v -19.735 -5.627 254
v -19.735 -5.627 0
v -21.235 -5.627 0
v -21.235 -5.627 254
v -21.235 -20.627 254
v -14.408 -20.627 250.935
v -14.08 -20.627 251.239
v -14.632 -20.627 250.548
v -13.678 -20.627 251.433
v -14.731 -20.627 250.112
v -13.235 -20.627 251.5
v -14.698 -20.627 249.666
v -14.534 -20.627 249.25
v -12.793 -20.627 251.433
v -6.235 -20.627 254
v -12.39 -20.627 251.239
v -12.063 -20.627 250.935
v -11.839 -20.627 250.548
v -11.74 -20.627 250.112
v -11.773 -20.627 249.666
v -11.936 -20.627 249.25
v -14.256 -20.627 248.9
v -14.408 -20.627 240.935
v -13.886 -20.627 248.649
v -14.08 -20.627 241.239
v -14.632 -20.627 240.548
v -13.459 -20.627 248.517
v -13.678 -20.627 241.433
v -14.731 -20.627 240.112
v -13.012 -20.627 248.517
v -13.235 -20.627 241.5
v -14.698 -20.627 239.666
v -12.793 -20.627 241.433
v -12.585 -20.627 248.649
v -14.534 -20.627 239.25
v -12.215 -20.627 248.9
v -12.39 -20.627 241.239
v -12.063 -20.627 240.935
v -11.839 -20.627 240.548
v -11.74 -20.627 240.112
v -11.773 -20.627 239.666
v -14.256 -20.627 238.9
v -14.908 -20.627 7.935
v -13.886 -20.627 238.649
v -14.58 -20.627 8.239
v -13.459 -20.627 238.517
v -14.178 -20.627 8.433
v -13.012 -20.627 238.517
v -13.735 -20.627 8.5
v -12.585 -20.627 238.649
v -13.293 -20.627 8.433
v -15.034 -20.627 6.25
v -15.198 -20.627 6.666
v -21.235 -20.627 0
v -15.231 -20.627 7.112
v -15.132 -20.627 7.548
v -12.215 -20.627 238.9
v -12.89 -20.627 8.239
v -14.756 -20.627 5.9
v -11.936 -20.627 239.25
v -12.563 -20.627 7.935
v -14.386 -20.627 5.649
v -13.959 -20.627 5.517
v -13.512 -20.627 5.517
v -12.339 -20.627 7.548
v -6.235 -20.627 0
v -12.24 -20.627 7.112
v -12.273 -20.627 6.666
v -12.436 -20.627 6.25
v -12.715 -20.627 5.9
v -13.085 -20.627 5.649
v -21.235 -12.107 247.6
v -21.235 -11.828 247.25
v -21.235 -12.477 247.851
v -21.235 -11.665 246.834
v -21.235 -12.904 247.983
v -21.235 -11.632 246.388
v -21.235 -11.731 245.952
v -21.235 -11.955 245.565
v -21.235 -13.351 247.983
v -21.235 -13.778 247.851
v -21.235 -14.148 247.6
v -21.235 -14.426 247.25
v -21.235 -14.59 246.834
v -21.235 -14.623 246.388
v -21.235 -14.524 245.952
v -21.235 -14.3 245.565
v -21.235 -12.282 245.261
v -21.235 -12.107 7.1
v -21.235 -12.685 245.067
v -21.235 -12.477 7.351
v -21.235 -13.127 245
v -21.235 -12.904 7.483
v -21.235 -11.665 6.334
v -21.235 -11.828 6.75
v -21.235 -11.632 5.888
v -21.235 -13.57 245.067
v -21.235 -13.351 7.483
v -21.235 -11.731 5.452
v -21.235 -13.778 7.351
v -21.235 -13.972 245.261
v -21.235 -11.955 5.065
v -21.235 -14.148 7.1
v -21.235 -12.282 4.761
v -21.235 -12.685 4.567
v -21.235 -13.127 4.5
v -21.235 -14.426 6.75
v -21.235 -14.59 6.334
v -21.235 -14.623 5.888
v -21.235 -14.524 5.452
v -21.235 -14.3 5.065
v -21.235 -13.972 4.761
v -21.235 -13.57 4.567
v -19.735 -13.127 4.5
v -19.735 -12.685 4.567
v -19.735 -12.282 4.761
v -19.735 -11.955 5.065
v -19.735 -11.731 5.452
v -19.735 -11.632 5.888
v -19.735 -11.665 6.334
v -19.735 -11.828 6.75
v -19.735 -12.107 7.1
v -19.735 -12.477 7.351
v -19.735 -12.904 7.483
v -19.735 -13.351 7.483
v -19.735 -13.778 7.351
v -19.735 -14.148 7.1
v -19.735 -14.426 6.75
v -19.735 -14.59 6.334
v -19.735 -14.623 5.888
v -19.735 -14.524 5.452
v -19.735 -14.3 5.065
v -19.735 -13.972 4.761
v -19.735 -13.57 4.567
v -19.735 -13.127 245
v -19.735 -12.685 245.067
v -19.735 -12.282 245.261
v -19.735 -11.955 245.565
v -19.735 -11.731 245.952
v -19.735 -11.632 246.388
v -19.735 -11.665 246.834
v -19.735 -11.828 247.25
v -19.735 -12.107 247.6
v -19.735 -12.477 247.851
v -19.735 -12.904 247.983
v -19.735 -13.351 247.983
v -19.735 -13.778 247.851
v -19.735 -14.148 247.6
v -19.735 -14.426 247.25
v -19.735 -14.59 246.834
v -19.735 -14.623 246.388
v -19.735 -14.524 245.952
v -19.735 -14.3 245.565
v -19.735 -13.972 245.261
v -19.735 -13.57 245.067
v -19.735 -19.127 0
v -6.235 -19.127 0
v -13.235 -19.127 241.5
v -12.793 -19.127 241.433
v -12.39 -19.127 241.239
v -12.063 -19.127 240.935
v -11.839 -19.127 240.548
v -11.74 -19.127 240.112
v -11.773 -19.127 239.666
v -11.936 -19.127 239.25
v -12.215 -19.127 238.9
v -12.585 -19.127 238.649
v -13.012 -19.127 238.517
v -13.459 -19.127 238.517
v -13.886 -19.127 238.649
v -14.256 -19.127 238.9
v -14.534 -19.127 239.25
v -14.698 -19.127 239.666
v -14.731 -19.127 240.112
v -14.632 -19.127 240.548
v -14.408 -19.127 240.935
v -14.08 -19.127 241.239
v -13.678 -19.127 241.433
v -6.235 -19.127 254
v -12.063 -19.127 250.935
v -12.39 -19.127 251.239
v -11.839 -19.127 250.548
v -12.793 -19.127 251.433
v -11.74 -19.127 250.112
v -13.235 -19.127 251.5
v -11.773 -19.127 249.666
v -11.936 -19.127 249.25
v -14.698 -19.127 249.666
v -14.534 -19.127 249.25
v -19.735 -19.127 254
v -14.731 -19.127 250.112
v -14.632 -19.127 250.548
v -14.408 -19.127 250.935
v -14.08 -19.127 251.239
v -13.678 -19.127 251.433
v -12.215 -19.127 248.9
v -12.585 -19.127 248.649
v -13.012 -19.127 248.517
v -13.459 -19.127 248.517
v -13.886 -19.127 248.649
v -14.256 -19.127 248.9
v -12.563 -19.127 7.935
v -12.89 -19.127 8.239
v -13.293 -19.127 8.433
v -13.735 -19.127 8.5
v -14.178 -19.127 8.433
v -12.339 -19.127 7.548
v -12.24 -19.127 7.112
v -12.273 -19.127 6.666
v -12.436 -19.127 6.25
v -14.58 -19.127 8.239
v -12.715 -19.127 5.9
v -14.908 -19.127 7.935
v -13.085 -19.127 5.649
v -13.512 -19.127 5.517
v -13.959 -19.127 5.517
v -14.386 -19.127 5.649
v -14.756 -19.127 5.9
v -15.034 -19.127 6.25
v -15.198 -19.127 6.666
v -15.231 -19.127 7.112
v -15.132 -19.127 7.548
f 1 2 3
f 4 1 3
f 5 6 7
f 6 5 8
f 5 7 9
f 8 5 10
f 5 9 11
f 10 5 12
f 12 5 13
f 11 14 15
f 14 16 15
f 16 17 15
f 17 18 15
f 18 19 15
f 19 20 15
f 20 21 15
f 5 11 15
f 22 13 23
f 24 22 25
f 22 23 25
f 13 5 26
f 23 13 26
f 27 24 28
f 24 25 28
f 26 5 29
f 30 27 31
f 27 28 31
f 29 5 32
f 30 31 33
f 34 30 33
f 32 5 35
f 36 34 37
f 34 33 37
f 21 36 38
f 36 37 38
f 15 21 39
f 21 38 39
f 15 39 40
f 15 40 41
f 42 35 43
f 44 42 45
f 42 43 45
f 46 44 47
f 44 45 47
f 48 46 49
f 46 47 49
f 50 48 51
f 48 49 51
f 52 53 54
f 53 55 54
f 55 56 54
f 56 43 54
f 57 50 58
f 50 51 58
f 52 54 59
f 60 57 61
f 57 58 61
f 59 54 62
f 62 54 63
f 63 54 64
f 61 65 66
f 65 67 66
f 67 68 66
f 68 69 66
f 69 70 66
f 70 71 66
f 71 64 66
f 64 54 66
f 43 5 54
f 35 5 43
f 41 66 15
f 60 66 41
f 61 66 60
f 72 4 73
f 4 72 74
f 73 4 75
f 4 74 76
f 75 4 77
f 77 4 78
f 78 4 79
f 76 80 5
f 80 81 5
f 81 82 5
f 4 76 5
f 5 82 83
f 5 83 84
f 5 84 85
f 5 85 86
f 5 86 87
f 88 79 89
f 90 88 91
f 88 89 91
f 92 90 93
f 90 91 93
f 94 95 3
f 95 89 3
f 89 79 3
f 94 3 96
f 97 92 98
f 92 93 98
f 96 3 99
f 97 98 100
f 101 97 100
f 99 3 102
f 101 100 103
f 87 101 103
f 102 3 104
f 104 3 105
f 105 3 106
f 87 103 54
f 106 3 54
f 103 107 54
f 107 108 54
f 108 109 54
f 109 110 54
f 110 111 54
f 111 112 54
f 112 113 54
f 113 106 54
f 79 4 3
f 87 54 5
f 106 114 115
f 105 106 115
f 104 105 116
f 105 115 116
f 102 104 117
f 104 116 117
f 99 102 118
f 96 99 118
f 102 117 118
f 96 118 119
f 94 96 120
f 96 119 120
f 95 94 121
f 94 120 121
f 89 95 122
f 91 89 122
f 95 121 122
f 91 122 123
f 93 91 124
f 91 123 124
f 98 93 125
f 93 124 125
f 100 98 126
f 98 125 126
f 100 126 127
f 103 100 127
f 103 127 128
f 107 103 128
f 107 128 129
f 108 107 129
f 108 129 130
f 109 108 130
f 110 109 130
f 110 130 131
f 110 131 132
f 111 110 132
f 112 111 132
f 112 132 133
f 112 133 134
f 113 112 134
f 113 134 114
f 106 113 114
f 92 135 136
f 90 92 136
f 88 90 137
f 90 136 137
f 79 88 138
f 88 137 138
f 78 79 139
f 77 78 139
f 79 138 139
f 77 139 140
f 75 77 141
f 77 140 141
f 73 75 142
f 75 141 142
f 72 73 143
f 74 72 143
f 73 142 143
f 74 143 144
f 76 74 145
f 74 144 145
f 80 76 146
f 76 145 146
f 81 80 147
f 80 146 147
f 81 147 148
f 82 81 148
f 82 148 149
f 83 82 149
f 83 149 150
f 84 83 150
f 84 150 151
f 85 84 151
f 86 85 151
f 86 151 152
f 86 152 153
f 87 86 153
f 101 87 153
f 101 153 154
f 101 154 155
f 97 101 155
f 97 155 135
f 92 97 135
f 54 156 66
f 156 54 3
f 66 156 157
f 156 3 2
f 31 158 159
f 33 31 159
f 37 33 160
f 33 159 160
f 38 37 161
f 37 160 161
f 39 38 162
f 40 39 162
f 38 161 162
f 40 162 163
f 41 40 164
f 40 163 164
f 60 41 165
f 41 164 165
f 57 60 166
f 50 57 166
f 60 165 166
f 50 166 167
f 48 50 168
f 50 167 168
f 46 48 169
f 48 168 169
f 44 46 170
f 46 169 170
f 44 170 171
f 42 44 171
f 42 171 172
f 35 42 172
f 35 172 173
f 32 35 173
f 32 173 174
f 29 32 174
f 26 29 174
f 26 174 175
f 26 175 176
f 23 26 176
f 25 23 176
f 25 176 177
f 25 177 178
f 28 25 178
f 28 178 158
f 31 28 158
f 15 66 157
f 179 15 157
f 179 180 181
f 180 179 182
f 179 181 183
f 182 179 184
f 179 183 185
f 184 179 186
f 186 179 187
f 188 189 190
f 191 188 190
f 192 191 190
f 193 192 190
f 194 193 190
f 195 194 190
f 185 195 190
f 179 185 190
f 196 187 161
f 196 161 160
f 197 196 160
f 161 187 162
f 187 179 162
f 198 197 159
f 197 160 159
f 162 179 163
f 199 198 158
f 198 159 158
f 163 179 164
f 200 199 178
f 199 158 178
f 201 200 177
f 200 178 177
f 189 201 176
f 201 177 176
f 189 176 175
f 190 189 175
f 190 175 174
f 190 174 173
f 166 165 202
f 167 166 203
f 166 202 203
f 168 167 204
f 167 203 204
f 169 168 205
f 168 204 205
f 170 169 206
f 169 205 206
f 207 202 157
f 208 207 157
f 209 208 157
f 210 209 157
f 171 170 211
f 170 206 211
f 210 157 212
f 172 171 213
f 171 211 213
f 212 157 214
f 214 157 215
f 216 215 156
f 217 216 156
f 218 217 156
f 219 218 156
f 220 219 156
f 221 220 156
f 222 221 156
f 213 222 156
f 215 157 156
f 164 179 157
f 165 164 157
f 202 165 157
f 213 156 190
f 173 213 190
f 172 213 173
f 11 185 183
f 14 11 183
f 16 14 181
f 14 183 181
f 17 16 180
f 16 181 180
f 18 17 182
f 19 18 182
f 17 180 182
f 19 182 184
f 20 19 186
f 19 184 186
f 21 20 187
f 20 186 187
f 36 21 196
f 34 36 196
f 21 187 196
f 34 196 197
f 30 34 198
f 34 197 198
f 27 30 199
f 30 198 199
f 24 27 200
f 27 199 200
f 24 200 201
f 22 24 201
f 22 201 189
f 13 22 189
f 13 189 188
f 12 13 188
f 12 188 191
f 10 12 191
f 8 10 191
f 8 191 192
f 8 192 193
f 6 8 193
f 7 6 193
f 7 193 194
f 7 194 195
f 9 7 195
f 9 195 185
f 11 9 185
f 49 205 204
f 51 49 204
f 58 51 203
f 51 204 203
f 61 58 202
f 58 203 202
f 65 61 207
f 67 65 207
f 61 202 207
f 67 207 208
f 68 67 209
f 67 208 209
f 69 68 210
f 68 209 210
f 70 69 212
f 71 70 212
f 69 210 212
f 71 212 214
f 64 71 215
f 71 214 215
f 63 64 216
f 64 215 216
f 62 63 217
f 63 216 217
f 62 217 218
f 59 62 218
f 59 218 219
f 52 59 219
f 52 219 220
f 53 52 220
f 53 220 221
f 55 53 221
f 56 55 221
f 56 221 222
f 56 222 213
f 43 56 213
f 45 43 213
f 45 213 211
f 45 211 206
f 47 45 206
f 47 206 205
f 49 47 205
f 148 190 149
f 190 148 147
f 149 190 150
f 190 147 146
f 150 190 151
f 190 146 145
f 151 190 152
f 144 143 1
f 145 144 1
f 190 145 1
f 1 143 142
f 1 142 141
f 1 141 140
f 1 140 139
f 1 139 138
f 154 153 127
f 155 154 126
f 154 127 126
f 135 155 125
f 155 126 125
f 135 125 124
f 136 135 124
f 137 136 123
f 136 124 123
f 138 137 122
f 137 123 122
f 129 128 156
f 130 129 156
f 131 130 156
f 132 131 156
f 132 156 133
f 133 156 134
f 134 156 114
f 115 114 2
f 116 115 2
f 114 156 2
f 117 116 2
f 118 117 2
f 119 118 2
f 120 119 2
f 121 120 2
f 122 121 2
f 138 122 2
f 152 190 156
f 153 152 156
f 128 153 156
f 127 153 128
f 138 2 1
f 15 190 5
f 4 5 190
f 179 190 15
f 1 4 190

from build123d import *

# Parameters (mm, degrees)
EXTRUSION1_DEPTH = 254
ESQUISSE2_R      = 1.5
EXTRUSION2_DEPTH = 186
ESQUISSE3_R      = 1.5
EXTRUSION3_DEPTH = 186


with BuildPart() as part:
    # Esquisse1 → Extrusion1 (new body)
    with BuildSketch(Plane.XY):
        Polygon((-21.235396624, -5.627388535), (-21.235396624, -20.627388535), (-6.235396624, -20.627388535), (-6.235396624, -19.127388535), (-19.735396624, -19.127388535), (-19.735396624, -5.627388535), align=None)
    extrude(amount=EXTRUSION1_DEPTH)

    # Esquisse2 → Extrusion2 (cut)
    with BuildSketch(Plane(origin=(0, -19.127388535, 0), x_dir=(-1, 0, 0), z_dir=(0, 1, 0))):
        with Locations(Location((13.735396624, 7, 0), (0, 0, 90))):
            Circle(ESQUISSE2_R)
        with Locations(Location((13.235396624, 250, 0), (0, 0, 90))):
            Circle(ESQUISSE2_R)
        with Locations(Location((13.235396624, 240, 0), (0, 0, 90))):
            Circle(ESQUISSE2_R)
    extrude(amount=-EXTRUSION2_DEPTH, mode=Mode.SUBTRACT)

    # Esquisse3 → Extrusion3 (cut)
    with BuildSketch(Plane(origin=(-19.735396624, 0, 0), x_dir=(0, 0, -1), z_dir=(1, 0, 0))):
        with Locations((-6, -13.127388535)):
            Circle(ESQUISSE3_R)
        with Locations((-246.5, -13.127388535)):
            Circle(ESQUISSE3_R)
    extrude(amount=-EXTRUSION3_DEPTH, mode=Mode.SUBTRACT)


solid = part.part
